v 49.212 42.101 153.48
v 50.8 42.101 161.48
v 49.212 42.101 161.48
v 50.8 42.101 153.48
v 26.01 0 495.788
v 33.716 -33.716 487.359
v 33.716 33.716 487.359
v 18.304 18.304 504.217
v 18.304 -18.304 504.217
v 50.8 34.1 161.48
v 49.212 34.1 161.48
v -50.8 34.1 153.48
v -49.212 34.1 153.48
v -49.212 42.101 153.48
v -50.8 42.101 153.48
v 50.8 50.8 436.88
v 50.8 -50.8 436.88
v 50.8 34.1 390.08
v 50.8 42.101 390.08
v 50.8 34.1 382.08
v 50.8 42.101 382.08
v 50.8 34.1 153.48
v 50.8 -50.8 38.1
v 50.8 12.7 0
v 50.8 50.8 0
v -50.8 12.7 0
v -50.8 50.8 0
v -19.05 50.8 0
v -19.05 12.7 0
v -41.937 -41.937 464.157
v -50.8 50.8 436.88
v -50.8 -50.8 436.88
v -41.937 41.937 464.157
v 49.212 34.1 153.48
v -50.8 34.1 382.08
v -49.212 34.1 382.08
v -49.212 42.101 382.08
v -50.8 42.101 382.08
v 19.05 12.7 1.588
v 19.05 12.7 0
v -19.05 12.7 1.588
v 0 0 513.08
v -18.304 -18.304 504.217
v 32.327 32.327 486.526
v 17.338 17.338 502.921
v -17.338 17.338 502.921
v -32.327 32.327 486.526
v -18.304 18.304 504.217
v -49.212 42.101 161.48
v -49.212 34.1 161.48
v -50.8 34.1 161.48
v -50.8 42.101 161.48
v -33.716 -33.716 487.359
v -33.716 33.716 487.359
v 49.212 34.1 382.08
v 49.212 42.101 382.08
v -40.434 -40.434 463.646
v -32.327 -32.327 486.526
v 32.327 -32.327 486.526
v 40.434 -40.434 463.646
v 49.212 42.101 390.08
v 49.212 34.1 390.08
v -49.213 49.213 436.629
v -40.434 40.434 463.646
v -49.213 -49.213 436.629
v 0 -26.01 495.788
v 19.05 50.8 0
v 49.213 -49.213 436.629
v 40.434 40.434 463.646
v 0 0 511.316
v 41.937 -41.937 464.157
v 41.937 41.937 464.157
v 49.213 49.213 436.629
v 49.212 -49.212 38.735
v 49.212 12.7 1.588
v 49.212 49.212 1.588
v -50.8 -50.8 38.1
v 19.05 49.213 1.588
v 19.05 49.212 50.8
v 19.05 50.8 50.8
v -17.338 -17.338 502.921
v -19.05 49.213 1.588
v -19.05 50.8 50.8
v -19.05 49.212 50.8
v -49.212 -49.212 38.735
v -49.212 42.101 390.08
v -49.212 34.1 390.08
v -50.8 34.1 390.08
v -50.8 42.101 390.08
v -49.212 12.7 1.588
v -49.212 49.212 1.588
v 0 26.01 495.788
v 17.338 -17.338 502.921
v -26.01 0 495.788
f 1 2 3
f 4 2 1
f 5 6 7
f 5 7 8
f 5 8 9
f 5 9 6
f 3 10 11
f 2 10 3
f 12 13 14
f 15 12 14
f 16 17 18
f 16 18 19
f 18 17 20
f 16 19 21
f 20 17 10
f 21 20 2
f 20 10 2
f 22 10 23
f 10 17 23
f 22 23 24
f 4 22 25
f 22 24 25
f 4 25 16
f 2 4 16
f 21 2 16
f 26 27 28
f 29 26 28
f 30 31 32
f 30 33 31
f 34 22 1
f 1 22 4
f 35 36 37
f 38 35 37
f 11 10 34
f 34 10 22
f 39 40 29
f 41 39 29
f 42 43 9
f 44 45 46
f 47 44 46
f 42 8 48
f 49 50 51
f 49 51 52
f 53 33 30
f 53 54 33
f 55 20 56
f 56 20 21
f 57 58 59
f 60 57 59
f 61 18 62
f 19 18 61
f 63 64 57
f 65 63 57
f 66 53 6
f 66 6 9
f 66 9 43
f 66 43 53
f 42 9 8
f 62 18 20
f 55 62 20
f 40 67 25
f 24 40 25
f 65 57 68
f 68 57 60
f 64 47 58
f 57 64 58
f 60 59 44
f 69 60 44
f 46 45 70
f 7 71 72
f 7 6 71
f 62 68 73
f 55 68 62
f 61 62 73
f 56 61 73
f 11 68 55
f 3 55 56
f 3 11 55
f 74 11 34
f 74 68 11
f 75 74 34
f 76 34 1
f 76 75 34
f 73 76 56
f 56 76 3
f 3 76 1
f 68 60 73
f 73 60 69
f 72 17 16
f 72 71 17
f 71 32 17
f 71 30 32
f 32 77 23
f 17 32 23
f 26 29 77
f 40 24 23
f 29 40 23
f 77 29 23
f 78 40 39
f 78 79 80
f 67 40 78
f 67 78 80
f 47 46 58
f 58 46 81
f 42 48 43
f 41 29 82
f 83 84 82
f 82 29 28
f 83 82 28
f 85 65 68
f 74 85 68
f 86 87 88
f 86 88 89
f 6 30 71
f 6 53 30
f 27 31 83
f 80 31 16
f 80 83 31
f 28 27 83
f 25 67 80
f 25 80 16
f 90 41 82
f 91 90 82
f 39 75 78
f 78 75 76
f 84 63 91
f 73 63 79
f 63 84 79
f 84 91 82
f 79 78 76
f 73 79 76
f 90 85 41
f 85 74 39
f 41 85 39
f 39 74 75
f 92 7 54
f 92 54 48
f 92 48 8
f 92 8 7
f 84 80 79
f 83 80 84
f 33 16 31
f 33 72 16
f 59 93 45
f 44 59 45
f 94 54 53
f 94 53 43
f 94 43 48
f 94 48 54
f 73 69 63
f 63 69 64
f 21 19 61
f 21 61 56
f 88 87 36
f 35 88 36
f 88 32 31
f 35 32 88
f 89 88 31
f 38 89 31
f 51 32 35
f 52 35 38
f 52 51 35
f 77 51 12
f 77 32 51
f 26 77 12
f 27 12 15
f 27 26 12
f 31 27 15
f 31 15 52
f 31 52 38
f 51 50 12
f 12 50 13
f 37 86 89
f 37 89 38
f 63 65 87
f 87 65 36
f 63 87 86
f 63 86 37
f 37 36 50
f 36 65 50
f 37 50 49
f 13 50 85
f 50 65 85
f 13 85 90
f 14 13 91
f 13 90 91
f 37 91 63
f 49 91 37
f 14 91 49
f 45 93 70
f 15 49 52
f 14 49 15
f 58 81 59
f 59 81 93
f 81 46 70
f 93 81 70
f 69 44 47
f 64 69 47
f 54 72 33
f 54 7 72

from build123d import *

# Parameters (mm, degrees)
SKETCH1_W           = 101.6
SKETCH1_H           = 101.6
BOSS_EXTRUDE1_DEPTH = 436.88
SHELL1_T            = -1.5875
SKETCH9_W           = 8.001
SKETCH9_H           = 8.001
CUT_EXTRUDE1_DEPTH  = 526.503840631
CUT_EXTRUDE2_DEPTH  = 526.503840631
BOSS_EXTRUDE2_DEPTH = 101.6
SKETCH12_W          = 38.1
SKETCH12_H          = 38.1
CUT_EXTRUDE3_DEPTH  = 50.8


with BuildPart() as part:
    # Sketch1 → Boss-Extrude1 (new body)
    with BuildSketch(Plane.XY):
        Rectangle(SKETCH1_W, SKETCH1_H)
    extrude(amount=BOSS_EXTRUDE1_DEPTH)

    # Sketch5 → Loft2 section 0
    with BuildSketch(Plane.XY.offset(436.88)):
        with BuildLine():
            Line((50.8, -50.8), (50.8, 50.8))
            Line((50.8, 50.8), (-50.8, 50.8))
            Line((-50.8, 50.8), (-50.8, -50.8))
            Line((-50.8, -50.8), (50.8, -50.8))
        make_face()
    # Sketch3 → Loft2 section 1
    with BuildSketch(Plane.XY.offset(464.156588322)):
        with BuildLine():
            Line((-41.937305, -41.937305), (41.937305, -41.937305))
            Line((41.937305, -41.937305), (41.937305, 41.937305))
            Line((41.937305, 41.937305), (-41.937305, 41.937305))
            Line((-41.937305, 41.937305), (-41.937305, -41.937305))
        make_face()
    loft()

    # Sketch3<6> → Loft3 section 0
    with BuildSketch(Plane.XY.offset(464.156588322)):
        with BuildLine():
            Line((-41.937305, -41.937305), (41.937305, -41.937305))
            Line((41.937305, -41.937305), (41.937305, 41.937305))
            Line((41.937305, 41.937305), (-41.937305, 41.937305))
            Line((-41.937305, 41.937305), (-41.937305, -41.937305))
        make_face()
    # Sketch6 → Loft3 section 1
    with BuildSketch(Plane.XY.offset(487.359440316)):
        with BuildLine():
            Line((-33.71596, -33.71596), (33.71596, -33.71596))
            Line((33.71596, -33.71596), (33.71596, 33.71596))
            Line((33.71596, 33.71596), (-33.71596, 33.71596))
            Line((-33.71596, 33.71596), (-33.71596, -33.71596))
        make_face()
    loft()

    # Sketch6<4> → Loft4 section 0
    with BuildSketch(Plane.XY.offset(487.359440316)):
        with BuildLine():
            Line((-33.71596, -33.71596), (33.71596, -33.71596))
            Line((33.71596, -33.71596), (33.71596, 33.71596))
            Line((33.71596, 33.71596), (-33.71596, 33.71596))
            Line((-33.71596, 33.71596), (-33.71596, -33.71596))
        make_face()
    # Sketch7 → Loft4 section 1
    with BuildSketch(Plane.XY.offset(504.217299158)):
        with BuildLine():
            Line((-18.304143458, -18.304143458), (18.304143458, -18.304143458))
            Line((18.304143458, -18.304143458), (18.304143458, 18.304143458))
            Line((18.304143458, 18.304143458), (-18.304143458, 18.304143458))
            Line((-18.304143458, 18.304143458), (-18.304143458, -18.304143458))
        make_face()
    loft()

    # Sketch7<5> → Loft5 section 0
    with BuildSketch(Plane.XY.offset(504.217299158), mode=Mode.PRIVATE) as loft5_s0:
        with BuildLine():
            Line((-18.304143458, -18.304143458), (18.304143458, -18.304143458))
            Line((18.304143458, -18.304143458), (18.304143458, 18.304143458))
            Line((18.304143458, 18.304143458), (-18.304143458, 18.304143458))
            Line((-18.304143458, 18.304143458), (-18.304143458, -18.304143458))
        make_face()
    loft([Vertex(0, 0, 513.079999985), loft5_s0.sketch])

    # Shell1
    shell1_openings = [part.faces().sort_by_distance(p)[0] for p in [
        (0, 0, 0),
    ]]
    offset(amount=SHELL1_T, openings=shell1_openings, kind=Kind.INTERSECTION)

    # Sketch9 → Cut-Extrude1 (cut, through all)
    with BuildSketch(Plane(origin=(50.8, 0, 0), x_dir=(0, 0, -1), z_dir=(1, 0, 0))):
        with Locations((-386.08, 38.1)):
            Rectangle(SKETCH9_W, SKETCH9_H)
        Polygon((-161.4805, 42.1005), (-161.4805, 38.1), (-161.4805, 34.0995), (-153.4795, 34.0995), (-153.4795, 42.1005), align=None)
    extrude(amount=-CUT_EXTRUDE1_DEPTH, mode=Mode.SUBTRACT)

    # Sketch10 → Cut-Extrude2 (cut, through all)
    with BuildSketch(Plane(origin=(50.8, 0, 0), x_dir=(0, 0, -1), z_dir=(1, 0, 0))):
        Polygon((0, -50.8), (0, 12.7), (-38.1, -50.8), align=None)
    extrude(amount=-CUT_EXTRUDE2_DEPTH, mode=Mode.SUBTRACT)

    # Sketch11 → Boss-Extrude2 (add)
    with BuildSketch(Plane(origin=(50.8, 0, 0), x_dir=(0, 0, -1), z_dir=(1, 0, 0))):
        Polygon((-38.1, -50.8), (-39.6875, -50.8), (-1.5875, 12.7), (-1.5875, 50.8), (0, 50.8), (0, 12.7), align=None)
    extrude(amount=-BOSS_EXTRUDE2_DEPTH)

    # Sketch12 → Cut-Extrude3 (cut)
    with BuildSketch(Plane(origin=(0, 0, 0), x_dir=(-1, 0, 0), z_dir=(0, 0, -1))):
        with Locations((0, 31.75)):
            Rectangle(SKETCH12_W, SKETCH12_H)
    extrude(amount=-CUT_EXTRUDE3_DEPTH, mode=Mode.SUBTRACT)


solid = part.part
